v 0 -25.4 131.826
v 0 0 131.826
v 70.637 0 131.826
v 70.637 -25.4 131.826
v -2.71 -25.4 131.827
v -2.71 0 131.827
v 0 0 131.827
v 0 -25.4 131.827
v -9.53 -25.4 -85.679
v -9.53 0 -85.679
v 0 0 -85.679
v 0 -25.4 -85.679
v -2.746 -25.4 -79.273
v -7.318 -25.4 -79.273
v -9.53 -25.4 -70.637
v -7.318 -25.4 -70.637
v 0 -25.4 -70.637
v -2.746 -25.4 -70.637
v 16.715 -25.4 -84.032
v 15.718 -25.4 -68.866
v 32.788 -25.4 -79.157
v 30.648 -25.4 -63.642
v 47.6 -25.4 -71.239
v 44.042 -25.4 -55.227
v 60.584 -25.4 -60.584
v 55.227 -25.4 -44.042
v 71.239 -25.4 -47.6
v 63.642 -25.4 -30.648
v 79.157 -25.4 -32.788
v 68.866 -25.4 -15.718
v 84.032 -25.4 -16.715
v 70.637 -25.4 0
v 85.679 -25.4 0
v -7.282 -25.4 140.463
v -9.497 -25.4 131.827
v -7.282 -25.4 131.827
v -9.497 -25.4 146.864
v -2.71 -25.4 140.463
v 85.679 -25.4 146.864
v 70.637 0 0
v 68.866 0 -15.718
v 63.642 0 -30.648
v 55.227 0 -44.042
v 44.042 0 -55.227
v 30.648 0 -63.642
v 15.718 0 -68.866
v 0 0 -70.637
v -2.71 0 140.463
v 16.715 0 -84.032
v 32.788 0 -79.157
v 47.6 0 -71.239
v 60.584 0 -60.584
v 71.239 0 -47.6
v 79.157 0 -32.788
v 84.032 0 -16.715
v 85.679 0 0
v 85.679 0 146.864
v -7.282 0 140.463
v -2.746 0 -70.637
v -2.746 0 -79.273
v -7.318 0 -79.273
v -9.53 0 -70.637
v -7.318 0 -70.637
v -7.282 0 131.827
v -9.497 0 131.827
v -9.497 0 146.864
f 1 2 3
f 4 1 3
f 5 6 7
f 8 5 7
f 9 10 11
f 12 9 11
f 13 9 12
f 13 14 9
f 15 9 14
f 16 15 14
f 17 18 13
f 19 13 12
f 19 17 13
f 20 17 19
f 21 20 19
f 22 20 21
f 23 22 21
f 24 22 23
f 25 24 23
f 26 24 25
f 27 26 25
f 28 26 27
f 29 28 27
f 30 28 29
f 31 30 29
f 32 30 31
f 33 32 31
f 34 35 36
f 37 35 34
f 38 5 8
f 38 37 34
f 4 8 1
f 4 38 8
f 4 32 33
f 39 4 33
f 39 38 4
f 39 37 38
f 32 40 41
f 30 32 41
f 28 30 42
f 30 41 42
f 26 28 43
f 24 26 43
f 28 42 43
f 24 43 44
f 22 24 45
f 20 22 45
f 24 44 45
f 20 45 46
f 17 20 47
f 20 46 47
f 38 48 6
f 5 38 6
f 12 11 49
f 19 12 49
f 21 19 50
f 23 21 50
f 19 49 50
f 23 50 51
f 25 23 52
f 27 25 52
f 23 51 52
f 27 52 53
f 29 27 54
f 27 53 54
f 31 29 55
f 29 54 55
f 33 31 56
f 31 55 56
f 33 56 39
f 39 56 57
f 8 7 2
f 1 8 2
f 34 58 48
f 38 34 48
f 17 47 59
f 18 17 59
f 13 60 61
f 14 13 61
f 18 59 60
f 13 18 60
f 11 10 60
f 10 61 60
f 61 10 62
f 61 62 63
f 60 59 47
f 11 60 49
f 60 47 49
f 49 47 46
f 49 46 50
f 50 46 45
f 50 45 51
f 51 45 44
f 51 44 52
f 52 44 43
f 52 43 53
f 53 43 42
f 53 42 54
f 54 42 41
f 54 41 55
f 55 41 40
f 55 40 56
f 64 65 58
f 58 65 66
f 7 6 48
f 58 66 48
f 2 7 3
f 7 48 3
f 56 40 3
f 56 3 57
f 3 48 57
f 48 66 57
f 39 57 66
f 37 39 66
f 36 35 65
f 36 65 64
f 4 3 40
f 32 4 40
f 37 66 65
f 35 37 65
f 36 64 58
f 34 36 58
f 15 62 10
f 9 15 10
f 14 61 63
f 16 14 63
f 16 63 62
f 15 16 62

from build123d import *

# Parameters (mm, degrees)
F1_DEPTH = 25.4


with BuildPart() as f1:
    # F0 (on Front) → F1 (new body)
    with BuildSketch(Plane.XZ):
        with BuildLine():
            Line((0, -70.6374), (0, -85.678593))
            ThreePointArc((0, -85.678593), (60.583914, -60.583914), (85.678593, 0))
            Line((85.678593, 0), (70.6374, 0))
            ThreePointArc((70.6374, 0), (49.948185, -49.948185), (0, -70.6374))
        make_face()
        Polygon((70.6374, 0), (85.678593, 0), (85.678593, 131.826), (85.678593, 146.863619), (70.6374, 146.863619), (0, 146.863619), (0, 131.826819), (0, 131.826), (70.6374, 131.826), align=None)
        Polygon((-2.709501, 131.826819), (0, 131.826819), (0, 146.863619), (-9.497362, 146.863619), (-9.497362, 131.826819), (-7.281501, 131.826819), (-7.281501, 140.462819), (-2.709501, 140.462819), align=None)
        Polygon((-9.529586, -85.678593), (0, -85.678593), (0, -70.6374), (-2.745675, -70.6374), (-2.745675, -79.2734), (-7.317675, -79.2734), (-7.317675, -70.6374), (-9.529586, -70.6374), align=None)
    extrude(amount=F1_DEPTH)


solid = f1.part
